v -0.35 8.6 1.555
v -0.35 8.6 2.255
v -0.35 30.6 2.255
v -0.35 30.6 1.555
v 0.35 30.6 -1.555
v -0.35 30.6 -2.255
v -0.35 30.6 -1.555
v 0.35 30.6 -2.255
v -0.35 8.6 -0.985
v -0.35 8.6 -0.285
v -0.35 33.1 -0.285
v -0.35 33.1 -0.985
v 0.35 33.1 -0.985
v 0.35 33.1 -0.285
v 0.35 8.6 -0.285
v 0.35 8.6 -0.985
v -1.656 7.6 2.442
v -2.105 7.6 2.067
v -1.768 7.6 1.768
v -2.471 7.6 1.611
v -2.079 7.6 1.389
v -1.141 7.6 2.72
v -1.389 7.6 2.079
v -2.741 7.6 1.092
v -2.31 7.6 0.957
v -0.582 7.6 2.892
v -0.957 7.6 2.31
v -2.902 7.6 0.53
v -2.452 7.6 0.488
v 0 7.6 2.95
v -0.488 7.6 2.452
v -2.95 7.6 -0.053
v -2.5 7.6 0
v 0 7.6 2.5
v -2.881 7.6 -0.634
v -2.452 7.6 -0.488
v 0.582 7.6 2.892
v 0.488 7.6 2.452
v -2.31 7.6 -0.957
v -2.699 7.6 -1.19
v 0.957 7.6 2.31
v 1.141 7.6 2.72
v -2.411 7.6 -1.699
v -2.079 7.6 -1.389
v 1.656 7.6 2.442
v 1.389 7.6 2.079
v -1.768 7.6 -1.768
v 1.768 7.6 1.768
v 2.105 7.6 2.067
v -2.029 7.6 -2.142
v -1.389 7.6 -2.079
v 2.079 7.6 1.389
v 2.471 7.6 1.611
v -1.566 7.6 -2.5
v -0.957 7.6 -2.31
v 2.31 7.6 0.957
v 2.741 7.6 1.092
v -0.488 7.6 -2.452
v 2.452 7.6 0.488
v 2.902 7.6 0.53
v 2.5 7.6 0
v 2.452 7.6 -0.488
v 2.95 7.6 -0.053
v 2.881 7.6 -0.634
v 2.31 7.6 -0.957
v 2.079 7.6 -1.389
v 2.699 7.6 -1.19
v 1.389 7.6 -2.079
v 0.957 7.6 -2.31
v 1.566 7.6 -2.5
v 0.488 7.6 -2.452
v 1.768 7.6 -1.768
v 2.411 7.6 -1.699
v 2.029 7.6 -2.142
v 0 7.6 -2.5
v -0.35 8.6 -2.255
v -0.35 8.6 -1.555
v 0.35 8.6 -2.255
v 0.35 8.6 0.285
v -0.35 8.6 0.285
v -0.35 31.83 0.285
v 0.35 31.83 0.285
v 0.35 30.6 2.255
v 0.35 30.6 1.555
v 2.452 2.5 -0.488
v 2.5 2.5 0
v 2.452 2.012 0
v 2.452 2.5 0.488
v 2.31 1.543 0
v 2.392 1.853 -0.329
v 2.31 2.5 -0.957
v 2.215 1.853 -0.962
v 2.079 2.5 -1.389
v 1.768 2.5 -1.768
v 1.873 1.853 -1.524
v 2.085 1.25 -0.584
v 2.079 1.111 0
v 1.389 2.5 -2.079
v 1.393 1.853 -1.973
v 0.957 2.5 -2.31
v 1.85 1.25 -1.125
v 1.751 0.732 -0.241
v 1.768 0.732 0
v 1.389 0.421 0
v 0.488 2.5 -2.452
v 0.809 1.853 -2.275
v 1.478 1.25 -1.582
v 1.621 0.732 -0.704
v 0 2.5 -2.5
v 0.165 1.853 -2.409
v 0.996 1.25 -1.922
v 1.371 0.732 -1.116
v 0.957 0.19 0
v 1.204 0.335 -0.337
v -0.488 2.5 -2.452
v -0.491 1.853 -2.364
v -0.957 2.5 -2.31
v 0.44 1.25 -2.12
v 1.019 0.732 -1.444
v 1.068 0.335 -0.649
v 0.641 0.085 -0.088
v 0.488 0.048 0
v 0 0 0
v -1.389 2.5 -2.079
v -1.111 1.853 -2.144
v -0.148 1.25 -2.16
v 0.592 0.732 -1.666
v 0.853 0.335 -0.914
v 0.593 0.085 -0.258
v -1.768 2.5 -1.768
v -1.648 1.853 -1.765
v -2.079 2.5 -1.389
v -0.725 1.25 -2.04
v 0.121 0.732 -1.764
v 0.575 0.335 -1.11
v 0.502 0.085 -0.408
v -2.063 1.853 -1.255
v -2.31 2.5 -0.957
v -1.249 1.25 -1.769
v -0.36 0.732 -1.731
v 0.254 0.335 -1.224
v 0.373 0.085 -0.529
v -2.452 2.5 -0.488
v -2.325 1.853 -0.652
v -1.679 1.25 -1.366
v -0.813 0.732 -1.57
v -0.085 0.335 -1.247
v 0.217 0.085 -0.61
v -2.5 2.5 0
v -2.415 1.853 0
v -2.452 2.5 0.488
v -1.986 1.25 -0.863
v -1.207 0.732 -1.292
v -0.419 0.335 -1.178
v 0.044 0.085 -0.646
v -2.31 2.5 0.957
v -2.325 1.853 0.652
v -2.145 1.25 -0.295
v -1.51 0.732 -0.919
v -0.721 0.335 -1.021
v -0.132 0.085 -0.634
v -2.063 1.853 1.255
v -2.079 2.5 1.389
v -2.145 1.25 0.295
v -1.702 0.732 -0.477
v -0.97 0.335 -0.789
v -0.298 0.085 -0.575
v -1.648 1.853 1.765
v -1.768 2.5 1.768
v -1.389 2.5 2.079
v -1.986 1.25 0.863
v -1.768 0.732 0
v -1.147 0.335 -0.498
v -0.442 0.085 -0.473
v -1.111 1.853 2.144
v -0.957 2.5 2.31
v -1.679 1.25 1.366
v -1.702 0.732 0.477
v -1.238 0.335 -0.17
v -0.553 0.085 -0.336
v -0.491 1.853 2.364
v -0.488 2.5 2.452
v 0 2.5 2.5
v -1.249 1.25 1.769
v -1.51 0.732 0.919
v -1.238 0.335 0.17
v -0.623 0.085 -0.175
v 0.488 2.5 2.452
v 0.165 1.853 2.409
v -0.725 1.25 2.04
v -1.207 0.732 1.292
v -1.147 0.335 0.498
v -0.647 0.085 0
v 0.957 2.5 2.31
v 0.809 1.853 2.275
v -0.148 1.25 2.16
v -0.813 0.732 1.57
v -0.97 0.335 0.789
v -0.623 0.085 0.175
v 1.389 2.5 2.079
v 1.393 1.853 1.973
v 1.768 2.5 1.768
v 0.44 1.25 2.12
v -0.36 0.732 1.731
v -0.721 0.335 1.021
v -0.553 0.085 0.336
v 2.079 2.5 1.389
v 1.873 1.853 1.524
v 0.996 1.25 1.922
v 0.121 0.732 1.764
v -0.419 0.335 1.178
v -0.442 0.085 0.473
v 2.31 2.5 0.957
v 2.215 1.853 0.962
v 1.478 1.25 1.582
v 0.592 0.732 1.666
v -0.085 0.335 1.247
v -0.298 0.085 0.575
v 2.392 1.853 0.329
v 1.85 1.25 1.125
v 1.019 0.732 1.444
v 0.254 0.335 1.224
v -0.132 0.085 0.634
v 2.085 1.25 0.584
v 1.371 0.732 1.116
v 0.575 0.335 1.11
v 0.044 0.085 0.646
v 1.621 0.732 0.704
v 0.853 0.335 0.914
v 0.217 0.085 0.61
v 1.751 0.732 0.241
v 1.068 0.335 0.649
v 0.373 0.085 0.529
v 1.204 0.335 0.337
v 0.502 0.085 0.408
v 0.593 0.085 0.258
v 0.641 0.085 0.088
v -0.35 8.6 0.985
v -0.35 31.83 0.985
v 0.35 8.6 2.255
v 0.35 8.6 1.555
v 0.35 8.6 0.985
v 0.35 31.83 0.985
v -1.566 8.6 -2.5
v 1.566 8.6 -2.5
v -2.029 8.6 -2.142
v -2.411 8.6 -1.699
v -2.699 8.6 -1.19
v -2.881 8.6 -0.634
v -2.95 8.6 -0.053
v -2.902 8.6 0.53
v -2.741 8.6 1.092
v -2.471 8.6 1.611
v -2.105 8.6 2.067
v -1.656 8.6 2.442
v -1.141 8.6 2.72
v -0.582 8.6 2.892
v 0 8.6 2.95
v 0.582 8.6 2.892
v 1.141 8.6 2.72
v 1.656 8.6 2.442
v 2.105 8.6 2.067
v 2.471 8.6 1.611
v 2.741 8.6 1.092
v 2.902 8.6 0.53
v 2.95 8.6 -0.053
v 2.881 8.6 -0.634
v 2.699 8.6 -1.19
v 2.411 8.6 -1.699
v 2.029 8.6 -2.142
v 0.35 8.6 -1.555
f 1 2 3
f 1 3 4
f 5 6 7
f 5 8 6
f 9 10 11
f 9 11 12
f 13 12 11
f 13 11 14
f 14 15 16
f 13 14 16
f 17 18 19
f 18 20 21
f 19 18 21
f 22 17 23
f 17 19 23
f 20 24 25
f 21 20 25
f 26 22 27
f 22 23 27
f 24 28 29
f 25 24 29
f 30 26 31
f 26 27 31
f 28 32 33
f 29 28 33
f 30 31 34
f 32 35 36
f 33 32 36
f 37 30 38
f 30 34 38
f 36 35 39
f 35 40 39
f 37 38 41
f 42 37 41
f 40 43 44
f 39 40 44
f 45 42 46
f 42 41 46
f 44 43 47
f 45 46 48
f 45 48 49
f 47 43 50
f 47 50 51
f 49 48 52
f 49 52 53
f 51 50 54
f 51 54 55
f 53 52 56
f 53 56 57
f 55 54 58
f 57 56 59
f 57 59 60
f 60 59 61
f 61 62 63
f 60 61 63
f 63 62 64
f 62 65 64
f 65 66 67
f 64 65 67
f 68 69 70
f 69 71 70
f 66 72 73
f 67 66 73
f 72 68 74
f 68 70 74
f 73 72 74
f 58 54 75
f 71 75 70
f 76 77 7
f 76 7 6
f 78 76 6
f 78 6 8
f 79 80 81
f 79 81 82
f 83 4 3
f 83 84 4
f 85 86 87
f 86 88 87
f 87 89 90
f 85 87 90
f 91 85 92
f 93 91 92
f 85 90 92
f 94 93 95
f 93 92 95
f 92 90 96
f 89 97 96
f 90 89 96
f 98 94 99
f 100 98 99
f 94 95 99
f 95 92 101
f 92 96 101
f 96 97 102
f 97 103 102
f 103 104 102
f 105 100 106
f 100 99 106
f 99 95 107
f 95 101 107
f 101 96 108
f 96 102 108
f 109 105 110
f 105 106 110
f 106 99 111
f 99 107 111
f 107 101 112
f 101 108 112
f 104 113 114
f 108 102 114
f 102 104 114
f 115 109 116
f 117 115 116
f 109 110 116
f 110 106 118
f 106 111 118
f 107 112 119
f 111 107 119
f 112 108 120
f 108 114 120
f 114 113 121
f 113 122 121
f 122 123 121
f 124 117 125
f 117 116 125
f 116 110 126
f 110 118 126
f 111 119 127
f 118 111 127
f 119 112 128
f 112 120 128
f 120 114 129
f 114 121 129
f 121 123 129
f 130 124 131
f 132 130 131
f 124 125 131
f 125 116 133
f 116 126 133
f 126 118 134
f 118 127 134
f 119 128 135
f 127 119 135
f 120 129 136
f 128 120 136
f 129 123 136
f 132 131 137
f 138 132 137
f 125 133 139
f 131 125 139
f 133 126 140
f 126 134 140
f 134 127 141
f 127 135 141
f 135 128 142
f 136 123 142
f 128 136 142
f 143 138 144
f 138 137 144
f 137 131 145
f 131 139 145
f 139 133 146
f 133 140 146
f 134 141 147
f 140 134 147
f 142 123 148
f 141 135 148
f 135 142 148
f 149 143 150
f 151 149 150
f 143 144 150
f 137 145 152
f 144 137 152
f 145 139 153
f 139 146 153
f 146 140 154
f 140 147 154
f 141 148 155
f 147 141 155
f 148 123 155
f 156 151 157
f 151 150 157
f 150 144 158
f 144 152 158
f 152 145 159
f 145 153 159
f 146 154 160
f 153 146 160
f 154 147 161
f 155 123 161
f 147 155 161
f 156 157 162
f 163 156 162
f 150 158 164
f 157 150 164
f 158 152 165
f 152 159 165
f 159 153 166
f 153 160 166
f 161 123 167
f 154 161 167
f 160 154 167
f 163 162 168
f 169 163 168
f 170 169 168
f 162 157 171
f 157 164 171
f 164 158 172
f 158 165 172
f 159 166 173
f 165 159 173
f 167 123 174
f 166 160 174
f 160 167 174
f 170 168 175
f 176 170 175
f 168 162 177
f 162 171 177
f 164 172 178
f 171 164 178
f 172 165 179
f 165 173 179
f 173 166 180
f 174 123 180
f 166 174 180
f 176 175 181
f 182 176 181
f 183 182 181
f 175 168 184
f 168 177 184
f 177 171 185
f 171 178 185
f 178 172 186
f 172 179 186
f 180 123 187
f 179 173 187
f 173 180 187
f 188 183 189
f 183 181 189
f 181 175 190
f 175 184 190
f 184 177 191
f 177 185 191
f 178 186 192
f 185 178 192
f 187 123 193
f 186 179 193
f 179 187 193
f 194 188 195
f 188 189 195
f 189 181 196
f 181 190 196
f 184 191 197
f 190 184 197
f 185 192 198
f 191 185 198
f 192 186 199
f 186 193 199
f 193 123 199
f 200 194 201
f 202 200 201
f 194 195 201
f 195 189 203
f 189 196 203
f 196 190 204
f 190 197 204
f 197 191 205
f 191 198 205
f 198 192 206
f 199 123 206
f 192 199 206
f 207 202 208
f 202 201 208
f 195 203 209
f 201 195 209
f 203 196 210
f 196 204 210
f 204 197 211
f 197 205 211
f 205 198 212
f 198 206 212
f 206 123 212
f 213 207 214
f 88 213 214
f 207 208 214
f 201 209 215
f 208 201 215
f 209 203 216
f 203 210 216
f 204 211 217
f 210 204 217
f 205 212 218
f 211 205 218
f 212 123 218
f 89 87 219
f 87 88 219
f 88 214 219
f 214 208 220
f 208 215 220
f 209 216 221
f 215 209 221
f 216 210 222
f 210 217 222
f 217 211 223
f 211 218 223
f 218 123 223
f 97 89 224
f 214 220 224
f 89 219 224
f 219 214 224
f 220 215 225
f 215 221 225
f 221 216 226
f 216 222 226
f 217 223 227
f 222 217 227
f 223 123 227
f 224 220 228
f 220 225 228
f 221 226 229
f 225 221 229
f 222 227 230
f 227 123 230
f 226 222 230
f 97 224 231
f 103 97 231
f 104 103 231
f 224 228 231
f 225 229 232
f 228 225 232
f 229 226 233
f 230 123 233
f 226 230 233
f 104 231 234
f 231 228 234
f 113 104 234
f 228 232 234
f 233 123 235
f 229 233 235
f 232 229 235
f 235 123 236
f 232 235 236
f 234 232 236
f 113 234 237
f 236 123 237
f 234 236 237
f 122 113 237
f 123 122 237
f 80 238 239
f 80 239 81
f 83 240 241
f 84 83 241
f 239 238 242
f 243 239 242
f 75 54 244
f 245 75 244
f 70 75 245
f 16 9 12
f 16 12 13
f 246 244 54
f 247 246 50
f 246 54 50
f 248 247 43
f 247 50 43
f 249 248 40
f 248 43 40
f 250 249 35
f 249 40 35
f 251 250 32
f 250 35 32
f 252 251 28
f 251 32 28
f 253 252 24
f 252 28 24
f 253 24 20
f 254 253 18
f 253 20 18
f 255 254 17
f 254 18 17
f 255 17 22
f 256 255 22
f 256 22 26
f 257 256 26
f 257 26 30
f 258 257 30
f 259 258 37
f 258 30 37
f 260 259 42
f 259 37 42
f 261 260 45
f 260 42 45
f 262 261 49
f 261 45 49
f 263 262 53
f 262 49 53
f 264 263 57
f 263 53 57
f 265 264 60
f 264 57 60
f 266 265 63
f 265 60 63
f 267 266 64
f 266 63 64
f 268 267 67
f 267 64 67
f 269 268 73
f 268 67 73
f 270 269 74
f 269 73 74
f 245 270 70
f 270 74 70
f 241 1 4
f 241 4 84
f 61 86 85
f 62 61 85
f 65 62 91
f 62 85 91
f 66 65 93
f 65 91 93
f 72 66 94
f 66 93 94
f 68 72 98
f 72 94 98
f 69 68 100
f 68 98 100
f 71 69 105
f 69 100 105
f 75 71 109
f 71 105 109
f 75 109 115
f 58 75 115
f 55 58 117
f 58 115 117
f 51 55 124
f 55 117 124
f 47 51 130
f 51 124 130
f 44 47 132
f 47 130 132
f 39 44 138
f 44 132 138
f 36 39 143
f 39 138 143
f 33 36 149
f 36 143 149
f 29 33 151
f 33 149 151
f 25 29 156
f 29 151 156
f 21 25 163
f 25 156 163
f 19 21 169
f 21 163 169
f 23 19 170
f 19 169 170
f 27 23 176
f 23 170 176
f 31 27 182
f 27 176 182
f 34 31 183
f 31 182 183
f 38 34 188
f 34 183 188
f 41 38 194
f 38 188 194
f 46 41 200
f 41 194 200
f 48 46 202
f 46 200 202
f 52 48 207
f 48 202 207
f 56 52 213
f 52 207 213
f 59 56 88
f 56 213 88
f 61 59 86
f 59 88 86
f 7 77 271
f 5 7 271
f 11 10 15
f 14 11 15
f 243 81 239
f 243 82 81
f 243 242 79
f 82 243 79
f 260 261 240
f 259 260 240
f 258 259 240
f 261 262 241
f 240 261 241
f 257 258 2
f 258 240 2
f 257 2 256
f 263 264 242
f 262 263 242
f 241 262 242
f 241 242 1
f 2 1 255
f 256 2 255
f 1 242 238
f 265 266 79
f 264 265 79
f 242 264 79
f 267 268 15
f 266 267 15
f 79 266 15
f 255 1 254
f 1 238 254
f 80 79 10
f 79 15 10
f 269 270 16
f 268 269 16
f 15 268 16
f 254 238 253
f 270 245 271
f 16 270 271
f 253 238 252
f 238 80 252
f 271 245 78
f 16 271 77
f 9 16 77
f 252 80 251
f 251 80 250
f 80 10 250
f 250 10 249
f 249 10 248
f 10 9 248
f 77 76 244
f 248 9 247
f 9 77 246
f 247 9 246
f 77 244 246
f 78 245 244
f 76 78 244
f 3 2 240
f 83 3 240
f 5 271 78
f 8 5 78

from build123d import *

# Parameters (mm, degrees)
ENL_V_MAT_EXTRU_1_REACH = 3
ESQUISSE3_W             = 0.7
ESQUISSE3_H             = 0.7
BOSS_EXTRU_1_DEPTH      = 24.5
ENL_V_START             = -3.3
ENL_V_MAT_EXTRU_2_DEPTH = 5.9


with BuildPart() as part:
    # Esquisse1 → Révolution1 (revolve)
    with BuildSketch(Plane.XY):
        with BuildLine():
            Line((2.5, 7.6), (2.5, 2.5))
            ThreePointArc((2.5, 2.5), (1.767766953, 0.732233047), (0, 0))
            Line((0, 0), (0, 8.6))
            Line((0, 8.6), (2.95, 8.6))
            Line((2.95, 8.6), (2.95, 7.6))
            Line((2.95, 7.6), (2.5, 7.6))
        make_face()
    revolve(axis=Axis((0, 0, 0), (0, 1, 0)))

    # Esquisse2 → Enlèv. mat.-Extru.1 (cut, up to next)
    with BuildSketch(Plane(origin=(0, 7.6, 0), x_dir=(-1, 0, 0), z_dir=(0, -1, 0)), mode=Mode.PRIVATE) as enl_v_mat_extru_1_sk1:
        Polygon((2.031643218, 2.5), (-2.119175806, 2.5), (-0.304277426, 5.41579693), align=None)
    enl_v_mat_extru_1_tool1 = extrude(enl_v_mat_extru_1_sk1.sketch, amount=-ENL_V_MAT_EXTRU_1_REACH, mode=Mode.PRIVATE) & part.part
    add(enl_v_mat_extru_1_tool1.solids().sort_by_distance((0.130603, 7.6, -3.471932))[0], mode=Mode.SUBTRACT)

    # Esquisse3 → Boss.-Extru.1 (add)
    with BuildSketch(Plane(origin=(0, 8.6, 0), x_dir=(1, 0, 0), z_dir=(0, 1, 0))):
        with Locations((0, 1.905)):
            Rectangle(ESQUISSE3_W, ESQUISSE3_H)
        with Locations((0, -0.635)):
            Rectangle(ESQUISSE3_W, ESQUISSE3_H)
        with Locations((0, -1.905)):
            Rectangle(ESQUISSE3_W, ESQUISSE3_H)
        with Locations((0, 0.635)):
            Rectangle(ESQUISSE3_W, ESQUISSE3_H)
    extrude(amount=BOSS_EXTRU_1_DEPTH)

    # Esquisse4 → Enlèv. mat.-Extru.2 (cut)
    with BuildSketch(Plane.ZY.offset(0.35).offset(ENL_V_START)):
        Polygon((-2.885095567, 30.6), (-1.265657514, 30.6), (-1.265657514, 33.921907916), (0, 33.921907916), (0, 31.83), (1.344412991, 31.83), (1.344412991, 30.6), (2.897512796, 30.6), (2.897512796, 34.676886987), (-2.885095567, 34.676886987), align=None)
    extrude(amount=ENL_V_MAT_EXTRU_2_DEPTH, mode=Mode.SUBTRACT)


solid = part.part
